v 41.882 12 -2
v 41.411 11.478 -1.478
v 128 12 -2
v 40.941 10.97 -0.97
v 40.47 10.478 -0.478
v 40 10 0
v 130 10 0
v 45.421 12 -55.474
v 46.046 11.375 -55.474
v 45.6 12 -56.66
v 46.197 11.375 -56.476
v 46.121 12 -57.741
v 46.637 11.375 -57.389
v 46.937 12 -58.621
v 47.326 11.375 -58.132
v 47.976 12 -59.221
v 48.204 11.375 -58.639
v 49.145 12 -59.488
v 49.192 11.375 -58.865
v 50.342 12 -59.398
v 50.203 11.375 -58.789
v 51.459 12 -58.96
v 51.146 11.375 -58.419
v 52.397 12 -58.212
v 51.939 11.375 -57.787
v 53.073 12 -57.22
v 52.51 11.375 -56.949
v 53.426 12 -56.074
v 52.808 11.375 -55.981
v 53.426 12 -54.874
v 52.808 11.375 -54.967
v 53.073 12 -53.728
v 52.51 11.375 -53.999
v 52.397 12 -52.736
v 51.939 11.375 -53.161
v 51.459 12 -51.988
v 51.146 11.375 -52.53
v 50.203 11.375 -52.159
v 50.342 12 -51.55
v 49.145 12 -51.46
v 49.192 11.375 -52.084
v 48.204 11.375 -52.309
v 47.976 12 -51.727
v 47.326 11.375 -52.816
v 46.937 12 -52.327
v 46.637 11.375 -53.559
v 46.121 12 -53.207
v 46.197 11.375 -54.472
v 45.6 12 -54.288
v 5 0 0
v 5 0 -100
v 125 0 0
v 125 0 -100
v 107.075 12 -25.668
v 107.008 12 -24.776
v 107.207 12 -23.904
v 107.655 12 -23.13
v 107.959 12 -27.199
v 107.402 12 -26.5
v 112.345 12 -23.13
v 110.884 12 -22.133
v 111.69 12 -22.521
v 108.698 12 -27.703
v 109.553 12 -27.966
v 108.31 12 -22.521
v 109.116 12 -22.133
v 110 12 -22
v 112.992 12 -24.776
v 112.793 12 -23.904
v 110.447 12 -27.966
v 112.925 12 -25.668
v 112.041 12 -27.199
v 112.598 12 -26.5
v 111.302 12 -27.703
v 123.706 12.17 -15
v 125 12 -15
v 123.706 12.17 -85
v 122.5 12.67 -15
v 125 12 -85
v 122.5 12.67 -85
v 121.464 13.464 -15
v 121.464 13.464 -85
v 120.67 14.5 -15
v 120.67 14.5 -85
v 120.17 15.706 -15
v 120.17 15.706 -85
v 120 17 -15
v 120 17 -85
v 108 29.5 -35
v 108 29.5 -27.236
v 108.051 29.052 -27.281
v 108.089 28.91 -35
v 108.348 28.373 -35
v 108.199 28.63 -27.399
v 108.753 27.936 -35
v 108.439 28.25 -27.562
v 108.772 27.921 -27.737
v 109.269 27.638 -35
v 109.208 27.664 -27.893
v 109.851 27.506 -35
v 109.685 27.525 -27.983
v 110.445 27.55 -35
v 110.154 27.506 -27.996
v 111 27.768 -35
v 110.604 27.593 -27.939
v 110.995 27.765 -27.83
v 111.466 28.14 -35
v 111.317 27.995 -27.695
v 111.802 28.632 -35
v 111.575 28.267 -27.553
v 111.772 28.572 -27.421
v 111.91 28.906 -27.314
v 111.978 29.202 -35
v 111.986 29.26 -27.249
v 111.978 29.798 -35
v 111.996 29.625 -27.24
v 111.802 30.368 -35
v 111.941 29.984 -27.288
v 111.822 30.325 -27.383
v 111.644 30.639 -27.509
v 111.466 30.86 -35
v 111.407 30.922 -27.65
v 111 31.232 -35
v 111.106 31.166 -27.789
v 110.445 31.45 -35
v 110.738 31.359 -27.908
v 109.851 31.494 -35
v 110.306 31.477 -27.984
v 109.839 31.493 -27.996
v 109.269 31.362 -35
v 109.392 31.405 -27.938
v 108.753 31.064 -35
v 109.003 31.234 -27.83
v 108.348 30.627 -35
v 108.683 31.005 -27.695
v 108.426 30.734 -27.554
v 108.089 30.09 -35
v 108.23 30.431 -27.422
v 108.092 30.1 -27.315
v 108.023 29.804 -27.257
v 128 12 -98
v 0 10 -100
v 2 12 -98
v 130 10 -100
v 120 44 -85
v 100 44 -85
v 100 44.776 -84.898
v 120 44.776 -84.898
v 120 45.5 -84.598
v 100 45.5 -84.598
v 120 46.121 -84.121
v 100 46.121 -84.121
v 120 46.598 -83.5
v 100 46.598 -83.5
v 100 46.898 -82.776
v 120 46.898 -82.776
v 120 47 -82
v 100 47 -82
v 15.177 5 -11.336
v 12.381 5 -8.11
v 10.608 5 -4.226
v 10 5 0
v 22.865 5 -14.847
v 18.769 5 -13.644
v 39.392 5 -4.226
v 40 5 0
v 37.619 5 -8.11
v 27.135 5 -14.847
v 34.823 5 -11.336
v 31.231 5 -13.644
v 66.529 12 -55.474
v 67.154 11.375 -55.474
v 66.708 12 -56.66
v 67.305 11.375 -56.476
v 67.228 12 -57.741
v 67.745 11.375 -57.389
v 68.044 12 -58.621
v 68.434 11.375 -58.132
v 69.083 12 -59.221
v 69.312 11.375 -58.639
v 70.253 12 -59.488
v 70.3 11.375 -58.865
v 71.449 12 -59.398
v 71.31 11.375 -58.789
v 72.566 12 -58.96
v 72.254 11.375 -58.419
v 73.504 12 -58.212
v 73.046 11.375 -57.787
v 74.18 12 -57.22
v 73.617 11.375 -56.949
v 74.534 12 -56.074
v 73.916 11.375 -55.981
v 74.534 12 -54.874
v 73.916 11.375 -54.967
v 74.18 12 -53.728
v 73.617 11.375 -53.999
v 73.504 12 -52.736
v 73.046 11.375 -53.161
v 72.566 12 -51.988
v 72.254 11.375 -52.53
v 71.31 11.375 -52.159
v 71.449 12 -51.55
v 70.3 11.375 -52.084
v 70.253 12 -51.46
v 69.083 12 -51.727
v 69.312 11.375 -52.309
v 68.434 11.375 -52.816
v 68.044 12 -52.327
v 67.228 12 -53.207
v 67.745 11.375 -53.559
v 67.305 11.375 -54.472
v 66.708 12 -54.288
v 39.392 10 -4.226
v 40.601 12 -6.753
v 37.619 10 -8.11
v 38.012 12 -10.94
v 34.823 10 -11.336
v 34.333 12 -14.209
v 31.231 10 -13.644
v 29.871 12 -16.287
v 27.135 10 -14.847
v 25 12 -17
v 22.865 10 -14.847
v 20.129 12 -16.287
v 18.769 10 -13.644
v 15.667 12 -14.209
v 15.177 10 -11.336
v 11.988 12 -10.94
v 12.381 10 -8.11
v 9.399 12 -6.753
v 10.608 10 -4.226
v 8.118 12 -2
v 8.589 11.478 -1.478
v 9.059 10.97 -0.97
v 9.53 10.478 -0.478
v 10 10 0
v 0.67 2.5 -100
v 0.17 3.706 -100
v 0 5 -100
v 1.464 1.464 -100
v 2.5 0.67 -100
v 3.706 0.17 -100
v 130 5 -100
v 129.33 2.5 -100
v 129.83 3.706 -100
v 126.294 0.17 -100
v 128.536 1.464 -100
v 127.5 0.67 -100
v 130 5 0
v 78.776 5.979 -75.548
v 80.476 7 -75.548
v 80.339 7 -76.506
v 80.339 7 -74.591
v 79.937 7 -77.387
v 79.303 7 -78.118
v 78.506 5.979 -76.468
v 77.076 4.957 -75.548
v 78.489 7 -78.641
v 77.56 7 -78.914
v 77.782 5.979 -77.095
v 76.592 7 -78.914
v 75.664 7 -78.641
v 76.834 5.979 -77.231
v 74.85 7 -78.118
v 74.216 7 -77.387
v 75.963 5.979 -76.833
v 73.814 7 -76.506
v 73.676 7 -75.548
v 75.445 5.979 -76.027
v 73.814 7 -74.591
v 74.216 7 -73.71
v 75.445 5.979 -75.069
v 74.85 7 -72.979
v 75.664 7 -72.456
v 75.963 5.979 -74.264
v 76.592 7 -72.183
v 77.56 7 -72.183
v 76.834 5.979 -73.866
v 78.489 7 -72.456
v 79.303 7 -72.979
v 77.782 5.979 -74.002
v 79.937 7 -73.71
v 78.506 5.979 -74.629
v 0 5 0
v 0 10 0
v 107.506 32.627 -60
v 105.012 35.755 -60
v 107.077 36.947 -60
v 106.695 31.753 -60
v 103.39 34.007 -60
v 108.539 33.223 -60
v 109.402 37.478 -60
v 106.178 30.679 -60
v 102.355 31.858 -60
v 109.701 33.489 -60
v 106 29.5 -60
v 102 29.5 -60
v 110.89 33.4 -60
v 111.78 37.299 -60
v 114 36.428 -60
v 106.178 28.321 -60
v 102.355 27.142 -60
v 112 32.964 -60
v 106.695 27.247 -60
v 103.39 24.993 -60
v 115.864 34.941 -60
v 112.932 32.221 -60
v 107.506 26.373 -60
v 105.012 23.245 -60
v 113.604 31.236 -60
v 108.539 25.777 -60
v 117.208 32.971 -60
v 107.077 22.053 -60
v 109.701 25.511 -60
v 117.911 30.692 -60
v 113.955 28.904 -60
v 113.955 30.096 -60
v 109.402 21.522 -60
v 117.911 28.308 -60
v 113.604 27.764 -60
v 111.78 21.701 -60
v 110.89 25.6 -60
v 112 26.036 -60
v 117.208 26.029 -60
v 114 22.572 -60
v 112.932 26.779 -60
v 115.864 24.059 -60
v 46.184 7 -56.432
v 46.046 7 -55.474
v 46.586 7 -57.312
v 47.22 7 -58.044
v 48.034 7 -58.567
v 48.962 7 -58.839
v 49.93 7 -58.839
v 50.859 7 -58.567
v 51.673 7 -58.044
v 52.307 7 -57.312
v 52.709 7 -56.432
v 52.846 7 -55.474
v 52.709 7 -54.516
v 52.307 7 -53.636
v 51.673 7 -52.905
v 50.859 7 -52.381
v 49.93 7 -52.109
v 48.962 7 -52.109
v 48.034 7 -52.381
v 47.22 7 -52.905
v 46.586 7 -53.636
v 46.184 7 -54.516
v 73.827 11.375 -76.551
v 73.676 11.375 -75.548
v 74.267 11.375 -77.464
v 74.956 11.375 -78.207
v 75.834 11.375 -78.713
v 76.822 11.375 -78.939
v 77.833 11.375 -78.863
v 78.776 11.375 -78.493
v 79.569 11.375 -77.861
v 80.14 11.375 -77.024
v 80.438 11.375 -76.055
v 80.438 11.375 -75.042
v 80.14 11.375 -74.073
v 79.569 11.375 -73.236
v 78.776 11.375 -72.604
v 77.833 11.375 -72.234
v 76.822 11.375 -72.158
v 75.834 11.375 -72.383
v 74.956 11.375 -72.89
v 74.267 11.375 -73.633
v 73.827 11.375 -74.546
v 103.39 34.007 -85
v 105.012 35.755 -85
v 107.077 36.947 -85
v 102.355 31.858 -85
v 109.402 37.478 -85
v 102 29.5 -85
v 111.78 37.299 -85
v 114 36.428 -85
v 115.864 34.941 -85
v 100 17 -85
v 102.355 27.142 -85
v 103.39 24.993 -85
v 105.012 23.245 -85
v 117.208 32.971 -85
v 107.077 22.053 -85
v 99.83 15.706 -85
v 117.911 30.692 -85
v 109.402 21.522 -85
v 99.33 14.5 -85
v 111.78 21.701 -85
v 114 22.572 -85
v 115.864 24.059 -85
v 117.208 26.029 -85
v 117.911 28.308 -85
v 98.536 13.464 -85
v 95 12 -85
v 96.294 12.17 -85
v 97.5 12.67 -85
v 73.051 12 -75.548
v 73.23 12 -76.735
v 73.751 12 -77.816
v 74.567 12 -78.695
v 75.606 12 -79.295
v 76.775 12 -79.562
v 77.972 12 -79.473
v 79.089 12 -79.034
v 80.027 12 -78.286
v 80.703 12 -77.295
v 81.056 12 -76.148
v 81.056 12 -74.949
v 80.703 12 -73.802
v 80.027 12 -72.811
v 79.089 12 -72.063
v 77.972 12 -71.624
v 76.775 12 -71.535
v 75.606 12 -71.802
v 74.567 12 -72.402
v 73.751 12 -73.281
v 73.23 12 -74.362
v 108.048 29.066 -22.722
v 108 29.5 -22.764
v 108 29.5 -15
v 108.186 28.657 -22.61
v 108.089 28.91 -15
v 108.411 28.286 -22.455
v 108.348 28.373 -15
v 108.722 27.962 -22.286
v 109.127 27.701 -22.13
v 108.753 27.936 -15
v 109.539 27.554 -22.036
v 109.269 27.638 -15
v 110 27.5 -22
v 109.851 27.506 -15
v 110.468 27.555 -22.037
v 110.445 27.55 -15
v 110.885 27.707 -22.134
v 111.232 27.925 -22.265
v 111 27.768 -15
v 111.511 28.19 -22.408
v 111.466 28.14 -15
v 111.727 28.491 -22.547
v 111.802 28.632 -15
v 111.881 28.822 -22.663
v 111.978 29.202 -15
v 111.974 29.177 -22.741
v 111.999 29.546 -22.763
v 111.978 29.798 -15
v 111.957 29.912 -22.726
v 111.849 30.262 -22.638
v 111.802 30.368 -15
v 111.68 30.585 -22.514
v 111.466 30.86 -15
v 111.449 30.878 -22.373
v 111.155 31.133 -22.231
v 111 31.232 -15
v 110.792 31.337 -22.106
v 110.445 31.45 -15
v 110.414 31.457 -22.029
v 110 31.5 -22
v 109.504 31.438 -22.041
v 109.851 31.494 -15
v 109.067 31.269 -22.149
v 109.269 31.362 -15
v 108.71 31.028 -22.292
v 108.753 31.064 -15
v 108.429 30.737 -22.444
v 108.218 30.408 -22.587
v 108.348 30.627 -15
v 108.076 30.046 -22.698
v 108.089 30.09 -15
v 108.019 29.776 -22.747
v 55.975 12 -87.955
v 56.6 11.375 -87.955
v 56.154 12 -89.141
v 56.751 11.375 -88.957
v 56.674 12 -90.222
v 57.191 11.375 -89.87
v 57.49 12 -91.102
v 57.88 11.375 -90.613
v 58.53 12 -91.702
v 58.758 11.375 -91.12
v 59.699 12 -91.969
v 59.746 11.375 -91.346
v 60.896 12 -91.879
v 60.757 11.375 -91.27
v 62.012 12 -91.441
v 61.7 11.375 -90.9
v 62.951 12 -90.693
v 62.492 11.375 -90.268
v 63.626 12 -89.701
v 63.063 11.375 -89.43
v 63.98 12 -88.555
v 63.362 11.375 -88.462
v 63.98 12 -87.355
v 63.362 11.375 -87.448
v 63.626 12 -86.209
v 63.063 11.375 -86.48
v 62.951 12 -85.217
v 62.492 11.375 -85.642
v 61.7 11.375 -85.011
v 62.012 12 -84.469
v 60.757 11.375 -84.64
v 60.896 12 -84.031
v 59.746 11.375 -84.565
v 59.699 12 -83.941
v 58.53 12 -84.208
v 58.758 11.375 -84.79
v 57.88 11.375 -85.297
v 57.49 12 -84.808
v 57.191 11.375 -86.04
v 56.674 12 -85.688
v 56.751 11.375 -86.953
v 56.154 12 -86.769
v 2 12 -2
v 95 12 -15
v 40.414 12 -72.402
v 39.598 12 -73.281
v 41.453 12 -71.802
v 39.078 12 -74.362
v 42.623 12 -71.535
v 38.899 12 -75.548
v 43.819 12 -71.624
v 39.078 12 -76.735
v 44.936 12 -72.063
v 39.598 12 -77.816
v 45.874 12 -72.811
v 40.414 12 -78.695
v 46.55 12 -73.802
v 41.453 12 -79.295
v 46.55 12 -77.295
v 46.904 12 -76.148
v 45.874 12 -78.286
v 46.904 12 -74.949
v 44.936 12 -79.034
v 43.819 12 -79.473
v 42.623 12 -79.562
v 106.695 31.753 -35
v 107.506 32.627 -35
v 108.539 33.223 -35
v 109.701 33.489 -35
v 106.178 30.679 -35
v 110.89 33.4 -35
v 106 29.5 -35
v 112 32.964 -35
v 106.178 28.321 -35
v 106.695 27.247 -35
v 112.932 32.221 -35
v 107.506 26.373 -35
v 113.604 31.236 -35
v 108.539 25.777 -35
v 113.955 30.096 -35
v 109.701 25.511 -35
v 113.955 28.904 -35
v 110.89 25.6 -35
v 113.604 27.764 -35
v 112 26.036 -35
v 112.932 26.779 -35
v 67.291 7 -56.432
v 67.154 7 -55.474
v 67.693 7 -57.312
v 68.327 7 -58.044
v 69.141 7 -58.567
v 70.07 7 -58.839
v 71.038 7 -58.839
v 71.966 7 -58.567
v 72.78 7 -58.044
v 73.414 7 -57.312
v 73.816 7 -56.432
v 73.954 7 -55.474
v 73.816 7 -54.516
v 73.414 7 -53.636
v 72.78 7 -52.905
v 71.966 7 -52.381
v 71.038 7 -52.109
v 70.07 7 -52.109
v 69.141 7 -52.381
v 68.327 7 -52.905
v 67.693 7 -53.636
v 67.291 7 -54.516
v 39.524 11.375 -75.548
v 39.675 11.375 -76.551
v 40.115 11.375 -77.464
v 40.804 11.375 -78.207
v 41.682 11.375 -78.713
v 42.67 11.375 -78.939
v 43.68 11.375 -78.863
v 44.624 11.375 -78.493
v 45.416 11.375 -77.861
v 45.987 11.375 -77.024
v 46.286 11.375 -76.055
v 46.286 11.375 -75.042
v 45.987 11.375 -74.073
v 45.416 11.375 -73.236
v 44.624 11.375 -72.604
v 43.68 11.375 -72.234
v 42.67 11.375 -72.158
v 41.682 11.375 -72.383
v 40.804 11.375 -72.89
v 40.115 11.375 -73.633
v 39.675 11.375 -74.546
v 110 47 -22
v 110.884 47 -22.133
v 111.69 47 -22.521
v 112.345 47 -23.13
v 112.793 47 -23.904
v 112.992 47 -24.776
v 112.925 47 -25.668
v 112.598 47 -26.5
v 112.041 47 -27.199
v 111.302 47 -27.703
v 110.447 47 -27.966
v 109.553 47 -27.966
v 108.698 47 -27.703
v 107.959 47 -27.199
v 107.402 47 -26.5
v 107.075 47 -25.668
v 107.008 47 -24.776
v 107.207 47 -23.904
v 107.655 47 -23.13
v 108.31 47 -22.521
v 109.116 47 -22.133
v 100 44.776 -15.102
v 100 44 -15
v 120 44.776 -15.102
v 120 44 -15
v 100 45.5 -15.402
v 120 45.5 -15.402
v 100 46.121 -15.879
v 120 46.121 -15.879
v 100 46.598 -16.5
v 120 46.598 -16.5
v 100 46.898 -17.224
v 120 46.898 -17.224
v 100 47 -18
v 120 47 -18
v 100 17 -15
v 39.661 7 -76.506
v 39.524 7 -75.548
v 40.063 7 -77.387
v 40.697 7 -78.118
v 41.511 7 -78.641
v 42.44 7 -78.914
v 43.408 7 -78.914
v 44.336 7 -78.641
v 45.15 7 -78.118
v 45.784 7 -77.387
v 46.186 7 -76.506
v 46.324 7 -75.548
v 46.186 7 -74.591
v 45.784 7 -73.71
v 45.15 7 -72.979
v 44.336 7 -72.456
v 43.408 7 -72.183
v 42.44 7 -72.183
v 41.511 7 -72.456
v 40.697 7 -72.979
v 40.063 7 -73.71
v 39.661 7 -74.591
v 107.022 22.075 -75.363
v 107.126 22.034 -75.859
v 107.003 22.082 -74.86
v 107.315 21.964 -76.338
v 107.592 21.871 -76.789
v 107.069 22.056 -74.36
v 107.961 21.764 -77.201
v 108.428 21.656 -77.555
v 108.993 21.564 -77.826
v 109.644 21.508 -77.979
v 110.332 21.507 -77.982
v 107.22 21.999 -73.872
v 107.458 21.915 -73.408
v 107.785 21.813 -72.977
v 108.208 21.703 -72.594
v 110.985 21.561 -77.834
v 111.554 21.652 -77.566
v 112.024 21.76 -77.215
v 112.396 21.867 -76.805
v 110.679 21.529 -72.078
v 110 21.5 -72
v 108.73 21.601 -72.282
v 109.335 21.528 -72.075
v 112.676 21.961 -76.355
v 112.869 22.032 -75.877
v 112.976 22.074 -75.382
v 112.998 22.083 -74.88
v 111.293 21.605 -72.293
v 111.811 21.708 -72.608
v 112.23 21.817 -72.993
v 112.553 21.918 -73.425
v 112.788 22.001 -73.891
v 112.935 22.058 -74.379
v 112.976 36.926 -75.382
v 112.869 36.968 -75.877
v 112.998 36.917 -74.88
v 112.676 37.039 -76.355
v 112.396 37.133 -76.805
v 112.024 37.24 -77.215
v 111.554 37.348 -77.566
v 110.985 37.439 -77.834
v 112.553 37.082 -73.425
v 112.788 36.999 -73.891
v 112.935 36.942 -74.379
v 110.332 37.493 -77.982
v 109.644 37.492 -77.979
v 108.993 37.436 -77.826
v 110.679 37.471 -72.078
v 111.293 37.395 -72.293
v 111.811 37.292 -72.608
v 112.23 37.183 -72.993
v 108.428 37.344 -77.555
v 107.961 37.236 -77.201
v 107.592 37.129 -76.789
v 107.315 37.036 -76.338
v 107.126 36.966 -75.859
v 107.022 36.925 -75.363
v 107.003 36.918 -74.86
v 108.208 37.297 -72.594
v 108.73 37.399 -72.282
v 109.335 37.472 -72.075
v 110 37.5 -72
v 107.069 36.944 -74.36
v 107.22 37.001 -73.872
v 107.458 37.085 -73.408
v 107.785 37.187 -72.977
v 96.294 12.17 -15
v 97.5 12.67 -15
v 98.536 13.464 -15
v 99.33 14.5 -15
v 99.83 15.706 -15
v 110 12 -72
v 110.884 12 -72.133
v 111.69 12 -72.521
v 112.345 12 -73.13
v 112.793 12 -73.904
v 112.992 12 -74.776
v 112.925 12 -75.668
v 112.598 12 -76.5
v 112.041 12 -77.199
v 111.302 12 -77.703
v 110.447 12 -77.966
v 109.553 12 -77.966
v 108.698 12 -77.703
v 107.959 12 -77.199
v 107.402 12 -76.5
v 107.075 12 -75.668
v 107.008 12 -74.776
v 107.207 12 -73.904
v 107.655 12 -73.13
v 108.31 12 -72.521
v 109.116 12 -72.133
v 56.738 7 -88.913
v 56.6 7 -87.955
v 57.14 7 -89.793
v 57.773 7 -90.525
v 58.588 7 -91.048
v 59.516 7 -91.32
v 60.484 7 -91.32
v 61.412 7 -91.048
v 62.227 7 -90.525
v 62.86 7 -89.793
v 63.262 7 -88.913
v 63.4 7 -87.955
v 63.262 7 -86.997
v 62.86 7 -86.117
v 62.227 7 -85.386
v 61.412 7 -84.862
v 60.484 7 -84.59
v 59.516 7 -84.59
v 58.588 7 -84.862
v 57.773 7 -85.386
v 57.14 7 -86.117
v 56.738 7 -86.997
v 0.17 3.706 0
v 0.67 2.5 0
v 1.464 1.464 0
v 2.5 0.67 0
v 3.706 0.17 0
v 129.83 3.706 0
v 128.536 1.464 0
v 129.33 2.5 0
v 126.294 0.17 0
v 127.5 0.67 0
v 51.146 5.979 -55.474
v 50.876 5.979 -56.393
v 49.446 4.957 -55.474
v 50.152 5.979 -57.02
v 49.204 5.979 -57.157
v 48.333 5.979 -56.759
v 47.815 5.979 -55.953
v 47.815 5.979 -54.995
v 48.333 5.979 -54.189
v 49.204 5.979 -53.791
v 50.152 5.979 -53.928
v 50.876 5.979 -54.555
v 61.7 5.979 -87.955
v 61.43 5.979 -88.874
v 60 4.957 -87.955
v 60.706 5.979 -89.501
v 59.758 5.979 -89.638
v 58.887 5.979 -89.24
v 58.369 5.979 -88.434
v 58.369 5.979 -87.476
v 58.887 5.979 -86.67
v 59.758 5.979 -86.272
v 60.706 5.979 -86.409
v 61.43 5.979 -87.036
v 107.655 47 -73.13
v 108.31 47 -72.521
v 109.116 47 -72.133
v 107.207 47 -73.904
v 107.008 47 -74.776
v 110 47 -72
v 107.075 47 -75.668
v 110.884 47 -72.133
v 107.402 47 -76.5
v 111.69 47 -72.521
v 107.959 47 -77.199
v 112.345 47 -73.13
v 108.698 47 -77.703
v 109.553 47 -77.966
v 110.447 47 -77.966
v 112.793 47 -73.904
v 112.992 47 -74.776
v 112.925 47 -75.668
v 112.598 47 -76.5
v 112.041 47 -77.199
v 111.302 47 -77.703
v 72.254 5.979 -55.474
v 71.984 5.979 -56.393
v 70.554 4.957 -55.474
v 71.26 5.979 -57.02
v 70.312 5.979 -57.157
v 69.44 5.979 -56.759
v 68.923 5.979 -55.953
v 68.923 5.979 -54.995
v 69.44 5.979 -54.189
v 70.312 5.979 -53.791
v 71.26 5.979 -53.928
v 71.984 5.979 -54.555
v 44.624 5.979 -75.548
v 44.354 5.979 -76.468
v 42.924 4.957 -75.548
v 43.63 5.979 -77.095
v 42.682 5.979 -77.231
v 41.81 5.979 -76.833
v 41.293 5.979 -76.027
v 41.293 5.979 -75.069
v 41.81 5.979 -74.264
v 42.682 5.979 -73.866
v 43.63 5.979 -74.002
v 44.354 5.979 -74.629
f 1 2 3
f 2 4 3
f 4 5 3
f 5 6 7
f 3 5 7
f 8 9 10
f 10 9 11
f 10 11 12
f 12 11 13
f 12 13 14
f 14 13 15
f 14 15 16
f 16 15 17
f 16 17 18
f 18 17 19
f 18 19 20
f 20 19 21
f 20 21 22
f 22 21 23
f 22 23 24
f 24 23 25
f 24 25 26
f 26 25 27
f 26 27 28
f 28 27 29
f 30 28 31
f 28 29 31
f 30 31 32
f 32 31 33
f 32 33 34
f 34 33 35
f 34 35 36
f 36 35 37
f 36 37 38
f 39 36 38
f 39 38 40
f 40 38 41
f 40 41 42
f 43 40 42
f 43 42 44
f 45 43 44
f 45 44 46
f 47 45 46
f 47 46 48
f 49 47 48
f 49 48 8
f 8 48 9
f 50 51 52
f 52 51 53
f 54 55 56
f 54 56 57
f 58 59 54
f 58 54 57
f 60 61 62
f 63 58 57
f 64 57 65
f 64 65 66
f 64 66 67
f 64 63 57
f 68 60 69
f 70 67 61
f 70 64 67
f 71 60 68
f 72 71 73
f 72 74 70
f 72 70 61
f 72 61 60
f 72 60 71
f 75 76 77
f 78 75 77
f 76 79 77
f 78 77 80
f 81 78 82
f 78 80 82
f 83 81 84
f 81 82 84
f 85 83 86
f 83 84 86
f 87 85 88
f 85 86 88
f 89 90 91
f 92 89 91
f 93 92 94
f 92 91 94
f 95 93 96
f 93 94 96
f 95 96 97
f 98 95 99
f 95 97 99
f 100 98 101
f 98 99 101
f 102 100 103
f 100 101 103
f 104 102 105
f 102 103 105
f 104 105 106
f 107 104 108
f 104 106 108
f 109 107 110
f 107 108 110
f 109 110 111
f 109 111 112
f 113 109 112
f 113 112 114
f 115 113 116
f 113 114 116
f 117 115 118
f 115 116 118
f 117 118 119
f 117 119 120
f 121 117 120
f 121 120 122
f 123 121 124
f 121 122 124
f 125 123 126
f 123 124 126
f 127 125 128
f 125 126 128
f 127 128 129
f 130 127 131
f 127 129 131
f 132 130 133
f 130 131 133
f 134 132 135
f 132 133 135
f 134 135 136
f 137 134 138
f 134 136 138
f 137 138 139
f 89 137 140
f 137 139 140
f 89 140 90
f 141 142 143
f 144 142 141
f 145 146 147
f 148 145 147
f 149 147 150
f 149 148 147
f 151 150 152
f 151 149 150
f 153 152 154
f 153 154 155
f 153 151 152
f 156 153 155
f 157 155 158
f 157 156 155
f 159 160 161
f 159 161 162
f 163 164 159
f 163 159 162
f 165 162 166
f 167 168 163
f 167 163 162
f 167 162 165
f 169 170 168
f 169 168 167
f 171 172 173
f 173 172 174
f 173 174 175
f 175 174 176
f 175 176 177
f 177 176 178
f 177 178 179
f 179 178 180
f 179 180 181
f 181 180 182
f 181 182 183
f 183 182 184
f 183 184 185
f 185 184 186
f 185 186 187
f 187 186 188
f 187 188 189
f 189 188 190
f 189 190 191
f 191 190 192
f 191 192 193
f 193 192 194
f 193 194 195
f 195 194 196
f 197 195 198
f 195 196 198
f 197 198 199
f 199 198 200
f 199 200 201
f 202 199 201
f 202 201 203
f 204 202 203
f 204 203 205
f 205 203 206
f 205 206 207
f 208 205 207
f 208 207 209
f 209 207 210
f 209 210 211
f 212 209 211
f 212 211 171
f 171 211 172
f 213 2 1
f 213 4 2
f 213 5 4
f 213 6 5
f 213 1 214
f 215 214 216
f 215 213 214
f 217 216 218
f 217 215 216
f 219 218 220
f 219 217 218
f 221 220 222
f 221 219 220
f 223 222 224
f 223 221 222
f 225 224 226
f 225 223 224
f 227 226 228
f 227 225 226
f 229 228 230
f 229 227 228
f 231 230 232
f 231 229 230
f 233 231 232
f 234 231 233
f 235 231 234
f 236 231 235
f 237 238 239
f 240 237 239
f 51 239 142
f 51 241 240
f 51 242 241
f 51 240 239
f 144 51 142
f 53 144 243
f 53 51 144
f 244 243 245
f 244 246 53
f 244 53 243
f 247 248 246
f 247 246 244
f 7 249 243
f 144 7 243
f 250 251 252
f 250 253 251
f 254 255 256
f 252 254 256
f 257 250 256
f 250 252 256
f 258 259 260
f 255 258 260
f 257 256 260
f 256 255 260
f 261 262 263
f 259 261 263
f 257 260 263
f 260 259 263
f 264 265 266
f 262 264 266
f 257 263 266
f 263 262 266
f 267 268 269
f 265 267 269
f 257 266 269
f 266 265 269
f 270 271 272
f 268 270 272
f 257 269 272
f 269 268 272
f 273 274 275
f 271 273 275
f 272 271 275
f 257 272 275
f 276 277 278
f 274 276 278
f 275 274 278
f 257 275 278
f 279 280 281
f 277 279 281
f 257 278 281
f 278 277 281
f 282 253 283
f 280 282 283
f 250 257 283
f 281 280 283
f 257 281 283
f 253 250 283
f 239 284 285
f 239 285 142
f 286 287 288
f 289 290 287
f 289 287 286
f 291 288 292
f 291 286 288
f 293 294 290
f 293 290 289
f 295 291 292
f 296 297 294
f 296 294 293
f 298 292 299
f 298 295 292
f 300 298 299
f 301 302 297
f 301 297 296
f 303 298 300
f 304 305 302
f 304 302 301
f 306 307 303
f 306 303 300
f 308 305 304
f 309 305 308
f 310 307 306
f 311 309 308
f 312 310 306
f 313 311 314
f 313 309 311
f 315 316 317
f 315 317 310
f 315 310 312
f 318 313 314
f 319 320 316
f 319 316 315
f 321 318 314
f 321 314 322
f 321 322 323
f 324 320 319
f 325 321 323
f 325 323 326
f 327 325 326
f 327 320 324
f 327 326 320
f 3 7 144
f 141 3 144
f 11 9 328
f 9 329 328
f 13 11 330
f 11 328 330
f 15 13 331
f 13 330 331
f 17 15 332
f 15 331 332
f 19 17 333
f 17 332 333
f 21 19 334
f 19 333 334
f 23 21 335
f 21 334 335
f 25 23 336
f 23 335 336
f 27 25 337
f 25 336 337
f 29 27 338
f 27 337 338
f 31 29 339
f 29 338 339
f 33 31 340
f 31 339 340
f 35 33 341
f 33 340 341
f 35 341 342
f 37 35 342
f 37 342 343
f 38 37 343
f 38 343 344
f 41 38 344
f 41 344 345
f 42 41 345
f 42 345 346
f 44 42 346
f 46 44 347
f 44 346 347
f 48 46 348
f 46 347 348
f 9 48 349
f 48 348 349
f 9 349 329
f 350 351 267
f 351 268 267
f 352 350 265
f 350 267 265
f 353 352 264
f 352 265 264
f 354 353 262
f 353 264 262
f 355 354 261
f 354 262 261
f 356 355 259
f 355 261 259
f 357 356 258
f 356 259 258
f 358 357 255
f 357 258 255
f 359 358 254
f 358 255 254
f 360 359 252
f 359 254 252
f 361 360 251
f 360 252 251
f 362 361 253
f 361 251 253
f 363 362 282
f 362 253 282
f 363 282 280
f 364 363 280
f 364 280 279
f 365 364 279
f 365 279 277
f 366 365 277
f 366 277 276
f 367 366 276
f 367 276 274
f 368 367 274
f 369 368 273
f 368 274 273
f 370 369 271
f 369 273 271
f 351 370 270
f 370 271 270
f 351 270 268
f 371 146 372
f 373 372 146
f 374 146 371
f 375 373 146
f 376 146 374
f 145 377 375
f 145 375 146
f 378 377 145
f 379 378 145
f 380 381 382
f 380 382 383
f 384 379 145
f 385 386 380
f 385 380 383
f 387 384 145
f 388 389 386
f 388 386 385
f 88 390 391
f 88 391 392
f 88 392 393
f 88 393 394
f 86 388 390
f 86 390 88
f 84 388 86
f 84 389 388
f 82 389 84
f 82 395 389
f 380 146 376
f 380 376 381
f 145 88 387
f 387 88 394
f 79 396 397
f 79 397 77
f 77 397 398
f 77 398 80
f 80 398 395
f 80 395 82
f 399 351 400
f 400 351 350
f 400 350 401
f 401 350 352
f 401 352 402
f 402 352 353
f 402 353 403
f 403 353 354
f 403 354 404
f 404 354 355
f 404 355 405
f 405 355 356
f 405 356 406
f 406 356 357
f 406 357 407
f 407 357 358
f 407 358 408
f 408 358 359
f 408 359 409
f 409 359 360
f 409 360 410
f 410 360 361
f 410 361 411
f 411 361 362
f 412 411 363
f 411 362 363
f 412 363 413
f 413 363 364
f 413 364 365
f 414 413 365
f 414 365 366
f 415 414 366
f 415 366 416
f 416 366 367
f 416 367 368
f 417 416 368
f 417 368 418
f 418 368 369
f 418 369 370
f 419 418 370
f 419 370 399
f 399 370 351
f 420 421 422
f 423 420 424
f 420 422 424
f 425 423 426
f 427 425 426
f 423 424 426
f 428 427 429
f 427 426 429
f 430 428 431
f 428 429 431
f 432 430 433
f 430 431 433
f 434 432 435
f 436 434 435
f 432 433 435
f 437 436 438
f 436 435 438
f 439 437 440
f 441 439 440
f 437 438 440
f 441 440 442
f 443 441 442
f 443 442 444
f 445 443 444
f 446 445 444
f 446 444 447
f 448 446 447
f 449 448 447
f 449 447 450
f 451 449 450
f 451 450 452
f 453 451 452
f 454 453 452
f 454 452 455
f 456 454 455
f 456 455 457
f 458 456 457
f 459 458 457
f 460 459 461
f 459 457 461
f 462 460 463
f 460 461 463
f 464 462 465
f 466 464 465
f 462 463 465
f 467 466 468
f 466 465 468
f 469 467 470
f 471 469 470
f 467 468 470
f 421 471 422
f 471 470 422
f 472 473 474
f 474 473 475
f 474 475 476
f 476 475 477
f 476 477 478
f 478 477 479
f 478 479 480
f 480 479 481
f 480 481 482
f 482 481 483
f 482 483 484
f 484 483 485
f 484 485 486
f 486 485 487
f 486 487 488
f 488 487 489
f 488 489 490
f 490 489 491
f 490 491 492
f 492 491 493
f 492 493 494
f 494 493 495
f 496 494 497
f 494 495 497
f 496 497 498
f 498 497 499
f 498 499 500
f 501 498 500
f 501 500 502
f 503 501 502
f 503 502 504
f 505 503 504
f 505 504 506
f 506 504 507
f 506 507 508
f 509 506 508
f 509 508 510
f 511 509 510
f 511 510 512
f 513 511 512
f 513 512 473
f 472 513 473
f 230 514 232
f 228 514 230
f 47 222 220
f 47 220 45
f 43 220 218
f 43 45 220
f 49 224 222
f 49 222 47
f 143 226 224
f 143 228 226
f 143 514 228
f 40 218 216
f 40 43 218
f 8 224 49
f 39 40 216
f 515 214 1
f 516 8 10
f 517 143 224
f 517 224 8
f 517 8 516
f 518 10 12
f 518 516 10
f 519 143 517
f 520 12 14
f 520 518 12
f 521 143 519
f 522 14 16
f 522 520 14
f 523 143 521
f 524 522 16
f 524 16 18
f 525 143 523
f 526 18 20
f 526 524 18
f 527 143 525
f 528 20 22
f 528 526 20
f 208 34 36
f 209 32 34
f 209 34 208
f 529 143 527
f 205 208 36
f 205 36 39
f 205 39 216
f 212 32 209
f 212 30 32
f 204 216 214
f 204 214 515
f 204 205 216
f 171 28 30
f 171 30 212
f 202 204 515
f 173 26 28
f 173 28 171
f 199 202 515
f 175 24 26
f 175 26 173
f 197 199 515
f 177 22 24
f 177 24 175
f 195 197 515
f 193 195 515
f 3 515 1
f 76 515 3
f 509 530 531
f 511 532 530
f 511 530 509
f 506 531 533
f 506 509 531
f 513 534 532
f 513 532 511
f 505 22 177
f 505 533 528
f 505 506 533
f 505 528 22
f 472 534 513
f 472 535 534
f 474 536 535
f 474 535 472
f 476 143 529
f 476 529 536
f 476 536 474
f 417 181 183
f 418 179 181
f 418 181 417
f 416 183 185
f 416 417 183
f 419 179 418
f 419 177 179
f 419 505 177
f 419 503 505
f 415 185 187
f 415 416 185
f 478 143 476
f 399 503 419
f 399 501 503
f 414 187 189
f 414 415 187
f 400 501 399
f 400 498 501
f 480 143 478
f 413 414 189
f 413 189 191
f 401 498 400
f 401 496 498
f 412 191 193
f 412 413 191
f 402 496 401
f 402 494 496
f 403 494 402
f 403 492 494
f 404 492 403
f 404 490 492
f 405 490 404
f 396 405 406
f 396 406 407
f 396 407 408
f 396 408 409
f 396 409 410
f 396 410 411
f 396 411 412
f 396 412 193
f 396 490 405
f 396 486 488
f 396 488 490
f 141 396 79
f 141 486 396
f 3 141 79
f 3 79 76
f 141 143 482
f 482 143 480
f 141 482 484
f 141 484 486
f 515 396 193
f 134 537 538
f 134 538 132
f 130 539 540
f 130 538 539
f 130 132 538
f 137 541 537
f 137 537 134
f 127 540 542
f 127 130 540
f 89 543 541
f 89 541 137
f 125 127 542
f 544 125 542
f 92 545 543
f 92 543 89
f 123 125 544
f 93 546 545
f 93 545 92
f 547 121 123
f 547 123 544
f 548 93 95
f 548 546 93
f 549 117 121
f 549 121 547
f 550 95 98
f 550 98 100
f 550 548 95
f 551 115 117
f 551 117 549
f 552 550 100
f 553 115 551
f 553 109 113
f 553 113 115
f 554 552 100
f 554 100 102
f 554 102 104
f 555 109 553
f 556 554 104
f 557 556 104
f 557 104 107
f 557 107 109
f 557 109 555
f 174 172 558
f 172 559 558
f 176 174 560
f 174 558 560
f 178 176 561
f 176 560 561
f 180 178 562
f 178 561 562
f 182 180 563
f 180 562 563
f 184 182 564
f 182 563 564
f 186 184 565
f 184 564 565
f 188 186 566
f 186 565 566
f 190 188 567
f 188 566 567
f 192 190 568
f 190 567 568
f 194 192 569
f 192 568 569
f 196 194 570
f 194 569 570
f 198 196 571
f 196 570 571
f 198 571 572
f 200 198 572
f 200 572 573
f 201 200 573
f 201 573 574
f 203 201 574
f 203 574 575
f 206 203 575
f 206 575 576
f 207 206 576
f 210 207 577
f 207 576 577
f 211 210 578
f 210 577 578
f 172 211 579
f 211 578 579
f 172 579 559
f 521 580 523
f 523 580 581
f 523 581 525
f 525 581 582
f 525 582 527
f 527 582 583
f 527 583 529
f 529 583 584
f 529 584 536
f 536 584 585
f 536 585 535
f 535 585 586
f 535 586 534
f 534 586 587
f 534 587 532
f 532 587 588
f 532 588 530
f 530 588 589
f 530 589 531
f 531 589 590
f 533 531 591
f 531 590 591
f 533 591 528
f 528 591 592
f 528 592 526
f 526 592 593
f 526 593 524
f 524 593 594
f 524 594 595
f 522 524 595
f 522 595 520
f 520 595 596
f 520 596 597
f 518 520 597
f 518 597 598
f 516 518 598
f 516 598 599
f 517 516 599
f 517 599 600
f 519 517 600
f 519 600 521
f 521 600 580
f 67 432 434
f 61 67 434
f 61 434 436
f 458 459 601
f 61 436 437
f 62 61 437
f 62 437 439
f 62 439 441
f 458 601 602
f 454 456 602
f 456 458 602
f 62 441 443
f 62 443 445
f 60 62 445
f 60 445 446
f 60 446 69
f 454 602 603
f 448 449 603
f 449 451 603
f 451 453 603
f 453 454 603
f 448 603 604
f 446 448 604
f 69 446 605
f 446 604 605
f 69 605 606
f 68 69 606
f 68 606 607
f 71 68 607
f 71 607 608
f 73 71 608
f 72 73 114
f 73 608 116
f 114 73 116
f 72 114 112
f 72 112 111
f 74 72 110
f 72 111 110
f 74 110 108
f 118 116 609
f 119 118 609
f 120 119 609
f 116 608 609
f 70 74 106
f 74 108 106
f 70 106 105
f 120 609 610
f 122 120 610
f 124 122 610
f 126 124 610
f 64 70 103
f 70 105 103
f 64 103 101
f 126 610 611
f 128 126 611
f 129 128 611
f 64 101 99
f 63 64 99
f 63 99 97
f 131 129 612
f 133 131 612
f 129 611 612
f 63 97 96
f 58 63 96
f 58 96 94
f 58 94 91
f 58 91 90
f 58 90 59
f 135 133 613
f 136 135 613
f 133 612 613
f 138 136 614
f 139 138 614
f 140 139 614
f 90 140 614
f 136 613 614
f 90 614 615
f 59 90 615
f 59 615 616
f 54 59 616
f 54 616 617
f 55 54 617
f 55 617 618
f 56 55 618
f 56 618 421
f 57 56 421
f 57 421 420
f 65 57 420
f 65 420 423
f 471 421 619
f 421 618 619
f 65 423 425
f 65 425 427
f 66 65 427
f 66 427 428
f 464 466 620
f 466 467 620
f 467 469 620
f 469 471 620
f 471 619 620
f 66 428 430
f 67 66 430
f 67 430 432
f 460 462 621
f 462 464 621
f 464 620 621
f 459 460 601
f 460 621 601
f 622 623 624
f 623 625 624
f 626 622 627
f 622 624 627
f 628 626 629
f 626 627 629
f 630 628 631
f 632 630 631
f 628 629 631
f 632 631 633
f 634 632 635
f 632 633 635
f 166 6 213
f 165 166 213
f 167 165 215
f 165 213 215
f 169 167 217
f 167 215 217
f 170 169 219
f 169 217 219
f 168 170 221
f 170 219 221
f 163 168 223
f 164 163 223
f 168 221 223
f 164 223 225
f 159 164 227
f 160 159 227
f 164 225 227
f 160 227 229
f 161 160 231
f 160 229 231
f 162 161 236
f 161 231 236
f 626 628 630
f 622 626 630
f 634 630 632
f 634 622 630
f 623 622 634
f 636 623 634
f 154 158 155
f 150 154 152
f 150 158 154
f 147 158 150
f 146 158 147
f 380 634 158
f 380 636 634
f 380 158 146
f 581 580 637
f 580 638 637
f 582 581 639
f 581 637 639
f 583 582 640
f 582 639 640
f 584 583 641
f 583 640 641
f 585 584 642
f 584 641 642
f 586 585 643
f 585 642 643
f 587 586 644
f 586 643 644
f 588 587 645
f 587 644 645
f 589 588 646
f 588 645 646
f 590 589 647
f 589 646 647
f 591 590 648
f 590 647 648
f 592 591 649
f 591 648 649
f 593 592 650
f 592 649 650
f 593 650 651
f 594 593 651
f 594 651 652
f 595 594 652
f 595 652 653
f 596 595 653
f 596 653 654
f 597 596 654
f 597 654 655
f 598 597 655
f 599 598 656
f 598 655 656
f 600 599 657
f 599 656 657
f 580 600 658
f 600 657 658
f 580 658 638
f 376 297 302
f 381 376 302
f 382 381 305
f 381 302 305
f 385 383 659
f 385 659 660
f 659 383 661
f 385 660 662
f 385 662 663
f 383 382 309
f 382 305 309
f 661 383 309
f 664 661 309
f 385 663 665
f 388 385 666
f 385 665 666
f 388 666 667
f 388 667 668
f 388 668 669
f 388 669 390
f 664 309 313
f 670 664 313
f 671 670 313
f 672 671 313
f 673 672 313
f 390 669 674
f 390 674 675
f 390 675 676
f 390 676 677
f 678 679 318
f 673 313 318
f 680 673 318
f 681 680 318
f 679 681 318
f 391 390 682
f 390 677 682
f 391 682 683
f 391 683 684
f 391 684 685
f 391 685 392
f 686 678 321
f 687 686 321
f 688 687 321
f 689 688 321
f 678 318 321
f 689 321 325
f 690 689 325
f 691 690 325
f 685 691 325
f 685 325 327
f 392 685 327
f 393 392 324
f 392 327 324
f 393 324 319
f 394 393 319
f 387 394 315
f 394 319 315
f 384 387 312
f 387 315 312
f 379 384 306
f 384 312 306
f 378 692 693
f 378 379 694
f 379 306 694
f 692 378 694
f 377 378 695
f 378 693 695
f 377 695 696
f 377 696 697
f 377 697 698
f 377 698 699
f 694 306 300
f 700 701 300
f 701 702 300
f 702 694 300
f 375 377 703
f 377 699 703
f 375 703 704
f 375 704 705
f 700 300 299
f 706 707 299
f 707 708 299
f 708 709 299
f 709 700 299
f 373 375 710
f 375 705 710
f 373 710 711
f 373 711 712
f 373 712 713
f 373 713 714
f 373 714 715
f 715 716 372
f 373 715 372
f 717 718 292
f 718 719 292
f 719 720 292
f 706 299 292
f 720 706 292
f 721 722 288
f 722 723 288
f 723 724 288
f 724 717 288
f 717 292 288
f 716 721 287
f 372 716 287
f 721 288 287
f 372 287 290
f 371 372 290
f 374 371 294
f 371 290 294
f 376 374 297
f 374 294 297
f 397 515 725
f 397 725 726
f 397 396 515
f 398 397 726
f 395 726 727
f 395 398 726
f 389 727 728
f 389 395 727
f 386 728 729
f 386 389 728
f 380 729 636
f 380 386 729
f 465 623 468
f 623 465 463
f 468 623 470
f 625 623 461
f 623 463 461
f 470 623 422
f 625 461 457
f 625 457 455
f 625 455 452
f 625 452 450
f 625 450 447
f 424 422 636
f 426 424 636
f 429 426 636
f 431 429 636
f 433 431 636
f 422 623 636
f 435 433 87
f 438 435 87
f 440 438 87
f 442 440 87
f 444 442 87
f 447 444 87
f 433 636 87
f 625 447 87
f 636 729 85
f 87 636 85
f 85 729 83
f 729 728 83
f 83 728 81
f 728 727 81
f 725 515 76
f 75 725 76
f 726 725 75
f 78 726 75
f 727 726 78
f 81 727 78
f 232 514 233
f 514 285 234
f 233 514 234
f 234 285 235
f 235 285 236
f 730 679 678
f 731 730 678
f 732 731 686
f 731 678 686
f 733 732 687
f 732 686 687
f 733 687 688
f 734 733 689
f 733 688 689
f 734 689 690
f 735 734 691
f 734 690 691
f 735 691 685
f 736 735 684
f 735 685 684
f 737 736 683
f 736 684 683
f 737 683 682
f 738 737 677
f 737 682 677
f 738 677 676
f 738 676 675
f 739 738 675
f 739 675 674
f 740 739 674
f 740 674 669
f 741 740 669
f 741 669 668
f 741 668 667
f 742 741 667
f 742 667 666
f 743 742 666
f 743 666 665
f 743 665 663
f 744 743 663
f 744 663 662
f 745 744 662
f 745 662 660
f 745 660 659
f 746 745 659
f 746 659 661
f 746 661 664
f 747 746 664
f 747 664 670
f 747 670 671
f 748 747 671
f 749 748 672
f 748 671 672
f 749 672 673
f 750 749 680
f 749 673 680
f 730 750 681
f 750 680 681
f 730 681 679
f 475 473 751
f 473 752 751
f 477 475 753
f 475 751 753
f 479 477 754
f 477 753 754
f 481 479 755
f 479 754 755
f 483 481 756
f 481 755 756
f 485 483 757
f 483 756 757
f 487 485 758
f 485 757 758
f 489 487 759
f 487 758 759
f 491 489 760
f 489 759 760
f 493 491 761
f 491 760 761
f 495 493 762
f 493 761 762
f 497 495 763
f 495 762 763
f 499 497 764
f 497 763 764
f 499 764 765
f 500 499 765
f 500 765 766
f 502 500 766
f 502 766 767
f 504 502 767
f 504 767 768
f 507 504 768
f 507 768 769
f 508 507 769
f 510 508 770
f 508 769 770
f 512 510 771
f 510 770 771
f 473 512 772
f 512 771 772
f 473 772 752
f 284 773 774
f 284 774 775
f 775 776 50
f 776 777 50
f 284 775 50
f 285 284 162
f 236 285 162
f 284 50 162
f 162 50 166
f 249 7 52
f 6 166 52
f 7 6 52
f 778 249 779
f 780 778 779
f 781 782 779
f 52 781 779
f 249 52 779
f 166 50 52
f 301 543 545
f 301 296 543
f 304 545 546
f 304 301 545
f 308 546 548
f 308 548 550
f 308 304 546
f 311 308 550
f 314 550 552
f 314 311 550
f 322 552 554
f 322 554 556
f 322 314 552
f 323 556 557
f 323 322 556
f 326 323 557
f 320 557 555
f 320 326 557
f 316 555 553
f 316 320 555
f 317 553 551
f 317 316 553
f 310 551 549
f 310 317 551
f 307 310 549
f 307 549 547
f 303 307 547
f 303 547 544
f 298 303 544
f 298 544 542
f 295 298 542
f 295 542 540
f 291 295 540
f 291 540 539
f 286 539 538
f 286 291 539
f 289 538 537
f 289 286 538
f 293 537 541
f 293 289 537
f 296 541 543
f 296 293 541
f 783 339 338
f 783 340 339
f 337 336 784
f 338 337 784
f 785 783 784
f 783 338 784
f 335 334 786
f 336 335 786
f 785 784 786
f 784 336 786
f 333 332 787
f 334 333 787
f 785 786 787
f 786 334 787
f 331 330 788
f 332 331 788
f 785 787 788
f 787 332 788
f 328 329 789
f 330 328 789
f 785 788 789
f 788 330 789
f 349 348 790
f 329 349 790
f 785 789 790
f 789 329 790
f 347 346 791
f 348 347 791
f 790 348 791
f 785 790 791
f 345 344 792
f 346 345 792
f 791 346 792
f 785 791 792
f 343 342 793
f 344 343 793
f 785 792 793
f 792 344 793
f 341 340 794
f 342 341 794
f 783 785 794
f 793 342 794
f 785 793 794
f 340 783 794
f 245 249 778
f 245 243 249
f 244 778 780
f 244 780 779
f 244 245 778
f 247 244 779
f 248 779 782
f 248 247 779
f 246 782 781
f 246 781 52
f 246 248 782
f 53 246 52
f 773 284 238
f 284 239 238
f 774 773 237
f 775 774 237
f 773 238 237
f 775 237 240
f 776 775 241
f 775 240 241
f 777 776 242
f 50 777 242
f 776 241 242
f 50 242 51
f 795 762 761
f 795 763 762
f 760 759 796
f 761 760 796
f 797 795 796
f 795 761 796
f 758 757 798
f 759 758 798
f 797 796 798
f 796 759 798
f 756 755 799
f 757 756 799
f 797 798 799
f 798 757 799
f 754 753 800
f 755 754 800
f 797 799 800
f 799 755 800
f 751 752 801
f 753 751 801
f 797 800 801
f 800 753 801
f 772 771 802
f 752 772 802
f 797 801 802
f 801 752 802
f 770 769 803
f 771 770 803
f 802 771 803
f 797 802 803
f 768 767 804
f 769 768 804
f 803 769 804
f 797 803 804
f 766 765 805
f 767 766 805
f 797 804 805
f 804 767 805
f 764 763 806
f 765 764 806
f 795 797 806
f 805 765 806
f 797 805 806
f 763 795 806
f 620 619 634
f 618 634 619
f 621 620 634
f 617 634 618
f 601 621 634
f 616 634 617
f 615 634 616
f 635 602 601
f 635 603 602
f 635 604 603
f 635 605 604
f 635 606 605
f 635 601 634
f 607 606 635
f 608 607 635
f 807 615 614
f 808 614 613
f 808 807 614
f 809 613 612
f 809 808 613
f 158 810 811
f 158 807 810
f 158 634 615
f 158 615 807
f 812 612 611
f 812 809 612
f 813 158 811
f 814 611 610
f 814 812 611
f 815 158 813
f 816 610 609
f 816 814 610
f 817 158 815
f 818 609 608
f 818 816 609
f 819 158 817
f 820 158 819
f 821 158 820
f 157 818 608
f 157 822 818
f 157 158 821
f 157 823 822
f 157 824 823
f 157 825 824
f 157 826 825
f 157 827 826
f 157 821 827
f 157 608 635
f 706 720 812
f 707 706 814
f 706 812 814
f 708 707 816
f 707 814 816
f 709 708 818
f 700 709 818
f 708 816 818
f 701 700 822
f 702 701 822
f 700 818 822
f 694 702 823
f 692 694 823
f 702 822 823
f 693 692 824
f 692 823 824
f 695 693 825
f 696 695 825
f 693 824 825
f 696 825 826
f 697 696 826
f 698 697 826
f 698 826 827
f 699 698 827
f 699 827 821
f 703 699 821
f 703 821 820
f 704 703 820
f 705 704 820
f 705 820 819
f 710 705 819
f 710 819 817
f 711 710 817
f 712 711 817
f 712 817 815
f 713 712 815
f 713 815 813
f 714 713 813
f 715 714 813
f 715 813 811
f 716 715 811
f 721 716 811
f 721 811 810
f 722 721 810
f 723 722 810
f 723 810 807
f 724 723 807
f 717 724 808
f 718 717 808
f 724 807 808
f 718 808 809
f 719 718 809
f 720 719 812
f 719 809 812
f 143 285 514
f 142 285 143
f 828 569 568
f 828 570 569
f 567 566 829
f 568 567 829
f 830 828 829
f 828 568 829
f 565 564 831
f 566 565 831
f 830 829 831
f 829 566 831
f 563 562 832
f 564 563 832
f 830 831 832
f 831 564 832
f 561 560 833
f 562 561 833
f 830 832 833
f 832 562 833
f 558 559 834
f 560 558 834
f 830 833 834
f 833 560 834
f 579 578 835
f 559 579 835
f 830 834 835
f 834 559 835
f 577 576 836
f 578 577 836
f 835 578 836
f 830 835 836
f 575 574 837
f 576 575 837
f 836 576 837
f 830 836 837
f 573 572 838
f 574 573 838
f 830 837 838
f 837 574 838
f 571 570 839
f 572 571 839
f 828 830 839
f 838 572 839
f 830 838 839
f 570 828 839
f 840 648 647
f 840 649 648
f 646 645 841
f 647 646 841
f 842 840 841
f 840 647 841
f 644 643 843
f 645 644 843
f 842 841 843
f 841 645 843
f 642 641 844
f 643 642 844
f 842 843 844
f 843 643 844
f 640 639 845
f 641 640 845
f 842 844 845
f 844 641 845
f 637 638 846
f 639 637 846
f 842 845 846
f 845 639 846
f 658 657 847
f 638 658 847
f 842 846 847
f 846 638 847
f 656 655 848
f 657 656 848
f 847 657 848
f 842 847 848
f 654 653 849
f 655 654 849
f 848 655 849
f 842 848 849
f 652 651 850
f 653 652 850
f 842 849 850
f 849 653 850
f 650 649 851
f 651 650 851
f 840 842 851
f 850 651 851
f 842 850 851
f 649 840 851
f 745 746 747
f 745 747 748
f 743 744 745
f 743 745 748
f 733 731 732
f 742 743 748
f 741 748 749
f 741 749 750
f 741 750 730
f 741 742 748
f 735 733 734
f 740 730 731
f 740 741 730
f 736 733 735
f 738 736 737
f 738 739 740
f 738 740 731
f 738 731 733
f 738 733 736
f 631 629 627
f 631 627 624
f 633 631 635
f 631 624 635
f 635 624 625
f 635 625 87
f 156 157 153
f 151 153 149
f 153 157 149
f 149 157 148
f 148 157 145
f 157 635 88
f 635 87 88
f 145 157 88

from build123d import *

# Parameters (mm, degrees)
SKETCH1_W                   = 130
SKETCH1_H                   = 100
BOSS_EXTRUDE1_DEPTH         = 12
CUT_EXTRUDE1_DEPTH          = 7
SKETCH4_W                   = 20
SKETCH4_H                   = 70
BOSS_EXTRUDE2_DEPTH         = 35
SKETCH5_W                   = 25
SKETCH5_H                   = 8
SKETCH5_W_2                 = 20
SKETCH5_H_2                 = 2
FILLET1_R                   = 5
CHAMFER1_SIZE               = 2
M8_TAPPED_HOLE1_D           = 6.8
M8_TAPPED_HOLE1_DEPTH       = 5
M8_TAPPED_HOLE1_CSINK_D     = 8.05
M8_TAPPED_HOLE1_CSINK_ANGLE = 90
M8_TAPPED_HOLE1_TIP         = 2.042926105
CUT_EXTRUDE2_REACH          = 172.614
SKETCH13_R                  = 3
FILLET2_R                   = 3
FILLET3_R                   = 5


with BuildPart() as part:
    # Sketch1 → Boss-Extrude1 (new body)
    with BuildSketch(Plane(origin=(0, 0, 0), x_dir=(1, 0, 0), z_dir=(0, 1, 0))):
        with Locations((65, 50)):
            Rectangle(SKETCH1_W, SKETCH1_H)
    extrude(amount=BOSS_EXTRUDE1_DEPTH)

    # Sketch3 → Cut-Extrude1 (cut)
    with BuildSketch(Plane(origin=(0, 12, 0), x_dir=(1, 0, 0), z_dir=(0, 1, 0))):
        with BuildLine():
            Line((10, 0), (40, 0))
            ThreePointArc((40, 0), (25, 15), (10, 0))
        make_face()
    extrude(amount=-CUT_EXTRUDE1_DEPTH, mode=Mode.SUBTRACT)

    # Sketch4 → Boss-Extrude2 (add)
    with BuildSketch(Plane(origin=(0, 12, 0), x_dir=(1, 0, 0), z_dir=(0, 1, 0))):
        with Locations((110, 50)):
            Rectangle(SKETCH4_W, SKETCH4_H)
    extrude(amount=BOSS_EXTRUDE2_DEPTH)

    # Sketch5 → Cut-Revolve1 (revolve, cut)
    with BuildSketch(Plane.ZY.offset(-110), mode=Mode.PRIVATE) as cut_revolve1_sk:
        with Locations((-72.5, 33.5)):
            Rectangle(SKETCH5_W, SKETCH5_H)
        Polygon((-60, 33.5), (-60, 29.5), (-35, 29.5), (-35, 31.5), (-35, 33.5), align=None)
        with Locations((-25, 30.5)):
            Rectangle(SKETCH5_W_2, SKETCH5_H_2)
    revolve(cut_revolve1_sk.sketch.rotate(Axis((110, 29.5, -85), (0, 0, 1)), 90), axis=Axis((110, 29.5, -85), (0, 0, 1)), mode=Mode.SUBTRACT)

    # Fillet1
    fillet1_edges = [part.edges().sort_by_distance(p)[0] for p in [
        (100, 12, -50),
        (120, 12, -50),
    ]]
    fillet(fillet1_edges, radius=FILLET1_R)

    # Chamfer1
    chamfer1_edges = [part.edges().sort_by_distance(p)[0] for p in [
        (130, 12, -50),
        (85, 12, 0),
        (65, 12, -100),
        (25, 12, -15),
        (0, 12, -50),
        (5, 12, 0),
    ]]
    chamfer(chamfer1_edges, length=CHAMFER1_SIZE)

    # M8 Tapped Hole1
    with Locations(Plane(origin=(0, 12, 0), x_dir=(1, 0, 0), z_dir=(0, 1, 0))):
        with Locations((42.923730365, 75.548416342), (60, 87.955052452), (77.076269635, 75.548416342), (70.553715035, 55.474057432), (49.446284965, 55.474057432)):
            CounterSinkHole(M8_TAPPED_HOLE1_D / 2, M8_TAPPED_HOLE1_CSINK_D / 2, depth=M8_TAPPED_HOLE1_DEPTH, counter_sink_angle=M8_TAPPED_HOLE1_CSINK_ANGLE)
            with Locations((0, 0, -(M8_TAPPED_HOLE1_DEPTH + M8_TAPPED_HOLE1_TIP / 2))):  # 118° drill point
                Cone(0, M8_TAPPED_HOLE1_D / 2, M8_TAPPED_HOLE1_TIP, mode=Mode.SUBTRACT)

    # Cut-Extrude2: up to this face of the body (flat: up to its plane)
    cut_extrude2_end = Plane(part.part.faces().sort_by_distance((56.685777118, 12, -51.176723205))[0])
    # Sketch13 → Cut-Extrude2 (cut, up to the picked face)
    with BuildSketch(Plane(origin=(0, 47, 0), x_dir=(1, 0, 0), z_dir=(0, 1, 0)), mode=Mode.PRIVATE) as cut_extrude2_sk1:
        with Locations(Location((110, 75, 0), (0, 0, 270))):
            Circle(SKETCH13_R)
    cut_extrude2_tool1 = split(extrude(cut_extrude2_sk1.sketch, amount=-CUT_EXTRUDE2_REACH, mode=Mode.PRIVATE), bisect_by=cut_extrude2_end, keep=Keep.BOTH, mode=Mode.PRIVATE)
    # Sketch13 → Cut-Extrude2 (cut, up to the picked face)
    with BuildSketch(Plane(origin=(0, 47, 0), x_dir=(1, 0, 0), z_dir=(0, 1, 0)), mode=Mode.PRIVATE) as cut_extrude2_sk2:
        with Locations(Location((110, 25, 0), (0, 0, 270))):
            Circle(SKETCH13_R)
    cut_extrude2_tool2 = split(extrude(cut_extrude2_sk2.sketch, amount=-CUT_EXTRUDE2_REACH, mode=Mode.PRIVATE), bisect_by=cut_extrude2_end, keep=Keep.BOTH, mode=Mode.PRIVATE)
    add(cut_extrude2_tool1.solids().sort_by(Axis((110, 47, -75), (0, -1, 0)))[0], mode=Mode.SUBTRACT)
    add(cut_extrude2_tool2.solids().sort_by(Axis((110, 47, -25), (0, -1, 0)))[0], mode=Mode.SUBTRACT)

    # Fillet2
    fillet2_edges = [part.edges().sort_by_distance(p)[0] for p in [
        (110, 47, -15),
        (110, 47, -85),
    ]]
    fillet(fillet2_edges, radius=FILLET2_R)

    # Fillet3
    fillet3_edges = [part.edges().sort_by_distance(p)[0] for p in [
        (130, 0, -50),
        (0, 0, -50),
    ]]
    fillet(fillet3_edges, radius=FILLET3_R)


solid = part.part
